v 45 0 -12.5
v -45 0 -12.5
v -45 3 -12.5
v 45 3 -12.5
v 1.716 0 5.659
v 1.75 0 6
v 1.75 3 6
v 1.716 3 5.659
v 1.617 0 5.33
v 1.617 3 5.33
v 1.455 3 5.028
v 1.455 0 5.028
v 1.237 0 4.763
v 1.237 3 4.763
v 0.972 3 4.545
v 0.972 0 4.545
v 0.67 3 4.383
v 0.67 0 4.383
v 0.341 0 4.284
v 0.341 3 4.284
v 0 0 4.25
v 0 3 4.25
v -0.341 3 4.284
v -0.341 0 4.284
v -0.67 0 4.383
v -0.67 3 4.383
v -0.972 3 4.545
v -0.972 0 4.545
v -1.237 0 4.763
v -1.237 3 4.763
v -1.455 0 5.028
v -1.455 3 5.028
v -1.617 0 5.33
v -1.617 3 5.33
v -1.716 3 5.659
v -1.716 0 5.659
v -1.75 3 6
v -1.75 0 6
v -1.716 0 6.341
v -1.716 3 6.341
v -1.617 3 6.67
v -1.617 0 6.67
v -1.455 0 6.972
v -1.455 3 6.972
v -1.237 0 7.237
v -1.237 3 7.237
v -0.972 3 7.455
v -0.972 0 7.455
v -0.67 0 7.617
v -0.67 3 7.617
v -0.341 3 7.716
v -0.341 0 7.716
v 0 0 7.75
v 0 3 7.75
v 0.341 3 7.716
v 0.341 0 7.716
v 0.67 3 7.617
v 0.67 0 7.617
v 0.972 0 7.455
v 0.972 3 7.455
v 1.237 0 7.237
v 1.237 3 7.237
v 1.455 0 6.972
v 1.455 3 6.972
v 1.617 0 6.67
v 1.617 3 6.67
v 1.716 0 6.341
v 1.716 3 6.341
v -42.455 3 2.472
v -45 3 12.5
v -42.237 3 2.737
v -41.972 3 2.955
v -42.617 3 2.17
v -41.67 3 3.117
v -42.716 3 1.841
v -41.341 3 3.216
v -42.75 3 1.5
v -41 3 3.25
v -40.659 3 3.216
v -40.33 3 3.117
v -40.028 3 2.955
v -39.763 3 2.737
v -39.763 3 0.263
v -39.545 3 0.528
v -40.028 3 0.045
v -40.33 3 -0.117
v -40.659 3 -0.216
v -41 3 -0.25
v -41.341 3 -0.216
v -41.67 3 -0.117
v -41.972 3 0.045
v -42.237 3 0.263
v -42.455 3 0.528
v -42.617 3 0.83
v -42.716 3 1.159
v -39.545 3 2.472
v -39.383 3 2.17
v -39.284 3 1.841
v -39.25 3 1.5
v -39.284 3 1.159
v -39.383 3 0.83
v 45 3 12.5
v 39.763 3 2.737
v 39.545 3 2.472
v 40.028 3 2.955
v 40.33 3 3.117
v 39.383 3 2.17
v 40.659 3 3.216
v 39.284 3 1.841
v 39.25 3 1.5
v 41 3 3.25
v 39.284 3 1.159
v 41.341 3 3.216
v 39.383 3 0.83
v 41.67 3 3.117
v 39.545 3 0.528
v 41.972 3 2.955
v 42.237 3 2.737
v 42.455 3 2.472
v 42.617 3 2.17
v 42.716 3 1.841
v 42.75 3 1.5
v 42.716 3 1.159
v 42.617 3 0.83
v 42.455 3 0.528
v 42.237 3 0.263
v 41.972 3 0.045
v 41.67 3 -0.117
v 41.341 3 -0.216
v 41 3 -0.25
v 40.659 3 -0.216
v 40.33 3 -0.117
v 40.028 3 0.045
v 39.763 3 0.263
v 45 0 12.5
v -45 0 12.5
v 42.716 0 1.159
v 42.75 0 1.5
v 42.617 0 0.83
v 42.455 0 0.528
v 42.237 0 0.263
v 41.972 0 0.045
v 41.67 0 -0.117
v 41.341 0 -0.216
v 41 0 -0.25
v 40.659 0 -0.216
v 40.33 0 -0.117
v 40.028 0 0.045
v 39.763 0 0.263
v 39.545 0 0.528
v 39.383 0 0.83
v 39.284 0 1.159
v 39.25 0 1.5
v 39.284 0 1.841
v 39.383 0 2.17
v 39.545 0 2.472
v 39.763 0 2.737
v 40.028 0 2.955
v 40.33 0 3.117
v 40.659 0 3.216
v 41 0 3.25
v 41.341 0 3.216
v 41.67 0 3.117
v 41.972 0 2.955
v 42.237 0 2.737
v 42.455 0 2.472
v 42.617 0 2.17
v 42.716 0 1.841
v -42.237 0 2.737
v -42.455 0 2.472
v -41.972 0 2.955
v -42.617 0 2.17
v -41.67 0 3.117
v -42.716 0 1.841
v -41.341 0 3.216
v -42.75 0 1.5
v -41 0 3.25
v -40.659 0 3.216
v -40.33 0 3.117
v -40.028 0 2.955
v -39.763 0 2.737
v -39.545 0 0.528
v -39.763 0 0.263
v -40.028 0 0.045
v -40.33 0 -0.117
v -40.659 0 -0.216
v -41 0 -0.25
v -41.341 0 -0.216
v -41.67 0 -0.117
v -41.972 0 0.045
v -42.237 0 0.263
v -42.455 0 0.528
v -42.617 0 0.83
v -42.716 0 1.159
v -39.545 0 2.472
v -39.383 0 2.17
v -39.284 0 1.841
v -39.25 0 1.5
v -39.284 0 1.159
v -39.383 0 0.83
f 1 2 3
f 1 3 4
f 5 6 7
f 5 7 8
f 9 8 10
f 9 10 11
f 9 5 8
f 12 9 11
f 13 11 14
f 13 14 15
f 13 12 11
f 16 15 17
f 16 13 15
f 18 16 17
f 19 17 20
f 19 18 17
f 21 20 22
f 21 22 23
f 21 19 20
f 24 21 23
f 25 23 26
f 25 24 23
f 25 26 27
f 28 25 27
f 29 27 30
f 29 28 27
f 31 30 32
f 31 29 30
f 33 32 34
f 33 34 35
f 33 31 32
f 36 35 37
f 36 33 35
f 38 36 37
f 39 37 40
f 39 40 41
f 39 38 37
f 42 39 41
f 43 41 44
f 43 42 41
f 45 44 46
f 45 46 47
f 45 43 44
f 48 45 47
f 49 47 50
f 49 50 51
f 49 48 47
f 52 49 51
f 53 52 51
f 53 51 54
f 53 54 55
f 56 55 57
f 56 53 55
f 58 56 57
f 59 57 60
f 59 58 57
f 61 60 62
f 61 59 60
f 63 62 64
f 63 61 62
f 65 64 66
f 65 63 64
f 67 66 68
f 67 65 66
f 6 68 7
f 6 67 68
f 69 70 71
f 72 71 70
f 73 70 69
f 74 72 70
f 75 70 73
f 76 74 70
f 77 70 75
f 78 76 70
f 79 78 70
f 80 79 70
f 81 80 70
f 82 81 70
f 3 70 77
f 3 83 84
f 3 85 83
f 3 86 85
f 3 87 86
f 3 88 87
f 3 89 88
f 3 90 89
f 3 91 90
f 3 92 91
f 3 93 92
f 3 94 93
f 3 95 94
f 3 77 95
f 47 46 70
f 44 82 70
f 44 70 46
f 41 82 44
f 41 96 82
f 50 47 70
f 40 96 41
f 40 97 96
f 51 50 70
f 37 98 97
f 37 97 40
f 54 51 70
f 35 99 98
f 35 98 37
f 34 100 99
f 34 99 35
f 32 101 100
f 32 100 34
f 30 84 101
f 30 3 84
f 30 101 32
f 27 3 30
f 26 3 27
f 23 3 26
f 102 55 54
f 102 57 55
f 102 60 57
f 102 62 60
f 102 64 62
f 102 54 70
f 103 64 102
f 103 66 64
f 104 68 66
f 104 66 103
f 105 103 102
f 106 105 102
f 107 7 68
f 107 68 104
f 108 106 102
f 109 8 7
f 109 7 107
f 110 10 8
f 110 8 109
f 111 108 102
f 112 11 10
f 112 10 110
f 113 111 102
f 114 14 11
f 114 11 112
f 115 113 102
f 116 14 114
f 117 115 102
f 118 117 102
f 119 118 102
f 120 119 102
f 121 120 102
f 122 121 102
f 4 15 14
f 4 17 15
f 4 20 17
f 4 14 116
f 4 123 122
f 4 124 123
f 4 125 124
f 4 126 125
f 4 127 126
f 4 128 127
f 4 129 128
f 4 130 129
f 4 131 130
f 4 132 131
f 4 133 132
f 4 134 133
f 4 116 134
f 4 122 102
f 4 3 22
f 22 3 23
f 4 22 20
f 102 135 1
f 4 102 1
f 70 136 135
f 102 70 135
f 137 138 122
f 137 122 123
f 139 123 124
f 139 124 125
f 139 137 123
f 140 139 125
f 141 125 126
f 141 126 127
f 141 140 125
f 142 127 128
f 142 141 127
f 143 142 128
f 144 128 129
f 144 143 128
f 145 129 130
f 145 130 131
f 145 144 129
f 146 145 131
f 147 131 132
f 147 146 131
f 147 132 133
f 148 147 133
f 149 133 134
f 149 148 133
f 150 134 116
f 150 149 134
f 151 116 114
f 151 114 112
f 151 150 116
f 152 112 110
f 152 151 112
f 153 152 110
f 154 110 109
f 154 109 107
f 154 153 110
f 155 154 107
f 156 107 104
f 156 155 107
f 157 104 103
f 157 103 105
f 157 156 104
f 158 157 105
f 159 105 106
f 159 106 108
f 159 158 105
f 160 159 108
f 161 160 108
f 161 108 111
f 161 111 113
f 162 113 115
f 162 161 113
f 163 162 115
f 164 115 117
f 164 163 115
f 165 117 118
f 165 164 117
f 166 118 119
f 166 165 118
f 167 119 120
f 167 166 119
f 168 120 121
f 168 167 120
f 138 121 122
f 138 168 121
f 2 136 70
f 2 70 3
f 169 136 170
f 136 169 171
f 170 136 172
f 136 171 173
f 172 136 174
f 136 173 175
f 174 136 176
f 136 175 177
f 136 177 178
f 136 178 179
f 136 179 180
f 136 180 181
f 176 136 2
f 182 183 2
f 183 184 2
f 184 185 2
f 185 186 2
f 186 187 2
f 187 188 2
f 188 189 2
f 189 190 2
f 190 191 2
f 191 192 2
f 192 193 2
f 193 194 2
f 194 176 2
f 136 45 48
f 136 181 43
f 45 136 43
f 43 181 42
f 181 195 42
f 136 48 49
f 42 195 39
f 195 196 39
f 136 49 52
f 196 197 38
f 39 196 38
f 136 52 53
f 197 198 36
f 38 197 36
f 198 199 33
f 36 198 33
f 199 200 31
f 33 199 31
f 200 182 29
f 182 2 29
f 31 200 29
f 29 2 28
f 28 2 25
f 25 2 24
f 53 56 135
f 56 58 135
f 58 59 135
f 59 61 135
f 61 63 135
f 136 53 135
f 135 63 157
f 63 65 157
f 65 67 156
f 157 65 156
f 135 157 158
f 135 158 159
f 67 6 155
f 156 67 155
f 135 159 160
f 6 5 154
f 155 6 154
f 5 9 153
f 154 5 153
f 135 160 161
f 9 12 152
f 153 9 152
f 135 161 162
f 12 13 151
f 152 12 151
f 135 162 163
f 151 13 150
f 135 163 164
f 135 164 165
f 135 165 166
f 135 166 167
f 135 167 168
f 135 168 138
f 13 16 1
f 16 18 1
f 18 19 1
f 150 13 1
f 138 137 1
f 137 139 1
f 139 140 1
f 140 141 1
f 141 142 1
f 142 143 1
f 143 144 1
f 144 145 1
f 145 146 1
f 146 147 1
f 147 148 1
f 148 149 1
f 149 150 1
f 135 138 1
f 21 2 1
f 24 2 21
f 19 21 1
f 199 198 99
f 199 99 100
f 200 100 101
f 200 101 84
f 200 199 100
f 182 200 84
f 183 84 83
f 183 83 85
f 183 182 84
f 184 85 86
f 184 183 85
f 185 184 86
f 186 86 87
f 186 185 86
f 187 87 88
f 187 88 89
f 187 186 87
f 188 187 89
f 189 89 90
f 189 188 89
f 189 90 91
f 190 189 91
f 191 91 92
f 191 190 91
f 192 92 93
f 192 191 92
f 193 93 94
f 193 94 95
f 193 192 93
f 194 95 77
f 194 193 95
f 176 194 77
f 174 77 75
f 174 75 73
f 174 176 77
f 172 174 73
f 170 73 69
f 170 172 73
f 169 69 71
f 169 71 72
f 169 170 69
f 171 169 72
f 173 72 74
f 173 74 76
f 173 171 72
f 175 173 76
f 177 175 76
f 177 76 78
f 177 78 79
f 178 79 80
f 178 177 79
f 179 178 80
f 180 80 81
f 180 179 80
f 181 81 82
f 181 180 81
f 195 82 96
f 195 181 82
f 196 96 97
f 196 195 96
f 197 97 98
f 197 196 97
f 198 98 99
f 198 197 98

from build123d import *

# Parameters (mm, degrees)
ESQUISSE1_W        = 90
ESQUISSE1_H        = 25
ESQUISSE1_R        = 1.75
BOSS_EXTRU_1_DEPTH = 3


with BuildPart() as part:
    # Esquisse1 → Boss.-Extru.1 (new body)
    with BuildSketch(Plane(origin=(0, 0, 0), x_dir=(1, 0, 0), z_dir=(0, 1, 0))):
        Rectangle(ESQUISSE1_W, ESQUISSE1_H)
        with Locations((-41, -1.5)):
            Circle(ESQUISSE1_R, mode=Mode.SUBTRACT)
        with Locations((41, -1.5)):
            Circle(ESQUISSE1_R, mode=Mode.SUBTRACT)
        with Locations((0, -6)):
            Circle(ESQUISSE1_R, mode=Mode.SUBTRACT)
    extrude(amount=BOSS_EXTRU_1_DEPTH)


solid = part.part
